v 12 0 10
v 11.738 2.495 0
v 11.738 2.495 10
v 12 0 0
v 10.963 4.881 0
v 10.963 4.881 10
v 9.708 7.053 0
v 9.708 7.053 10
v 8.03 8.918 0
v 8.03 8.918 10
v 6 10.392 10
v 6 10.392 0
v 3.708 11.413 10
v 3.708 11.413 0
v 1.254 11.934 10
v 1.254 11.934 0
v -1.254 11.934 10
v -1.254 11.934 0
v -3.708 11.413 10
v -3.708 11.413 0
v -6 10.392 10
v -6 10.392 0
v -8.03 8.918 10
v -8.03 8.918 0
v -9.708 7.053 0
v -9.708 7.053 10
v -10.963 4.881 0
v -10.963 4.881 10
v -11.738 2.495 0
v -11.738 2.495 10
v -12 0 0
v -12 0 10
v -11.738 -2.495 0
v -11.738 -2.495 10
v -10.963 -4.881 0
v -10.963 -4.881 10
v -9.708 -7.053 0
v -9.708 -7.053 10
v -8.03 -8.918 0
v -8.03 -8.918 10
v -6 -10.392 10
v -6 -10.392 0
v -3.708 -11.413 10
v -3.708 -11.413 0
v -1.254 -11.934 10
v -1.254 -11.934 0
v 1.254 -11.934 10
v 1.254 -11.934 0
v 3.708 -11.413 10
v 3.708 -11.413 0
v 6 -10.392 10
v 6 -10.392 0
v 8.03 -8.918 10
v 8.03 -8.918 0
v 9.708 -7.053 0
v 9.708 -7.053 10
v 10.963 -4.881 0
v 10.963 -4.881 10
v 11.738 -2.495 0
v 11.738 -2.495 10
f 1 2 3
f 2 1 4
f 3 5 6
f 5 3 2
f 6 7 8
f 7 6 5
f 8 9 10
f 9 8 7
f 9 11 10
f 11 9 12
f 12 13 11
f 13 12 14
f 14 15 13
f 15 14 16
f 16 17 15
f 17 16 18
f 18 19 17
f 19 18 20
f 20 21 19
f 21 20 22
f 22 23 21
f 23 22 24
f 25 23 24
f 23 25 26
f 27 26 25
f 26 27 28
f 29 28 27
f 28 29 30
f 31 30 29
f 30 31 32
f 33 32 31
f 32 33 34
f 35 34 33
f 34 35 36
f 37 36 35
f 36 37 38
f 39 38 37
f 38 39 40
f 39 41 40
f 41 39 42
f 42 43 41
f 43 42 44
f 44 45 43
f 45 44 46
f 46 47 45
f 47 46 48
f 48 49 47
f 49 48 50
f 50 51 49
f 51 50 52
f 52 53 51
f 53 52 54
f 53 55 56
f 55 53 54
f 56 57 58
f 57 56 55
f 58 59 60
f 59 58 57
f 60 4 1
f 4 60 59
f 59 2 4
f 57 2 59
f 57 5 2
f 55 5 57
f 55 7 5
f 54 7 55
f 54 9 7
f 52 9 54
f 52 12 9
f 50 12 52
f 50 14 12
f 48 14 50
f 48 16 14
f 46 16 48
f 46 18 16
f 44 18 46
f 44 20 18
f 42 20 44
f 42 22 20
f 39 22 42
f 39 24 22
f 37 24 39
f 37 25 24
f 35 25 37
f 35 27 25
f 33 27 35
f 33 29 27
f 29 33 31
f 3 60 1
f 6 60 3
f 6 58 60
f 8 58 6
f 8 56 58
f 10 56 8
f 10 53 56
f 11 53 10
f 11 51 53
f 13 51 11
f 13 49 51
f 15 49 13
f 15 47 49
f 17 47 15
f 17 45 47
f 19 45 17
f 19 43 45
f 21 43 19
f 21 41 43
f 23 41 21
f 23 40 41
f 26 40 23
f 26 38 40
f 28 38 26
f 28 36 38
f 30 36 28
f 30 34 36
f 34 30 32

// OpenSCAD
// Generated by generate_scads.py
cylinder(h=10, r=12, center=false);
